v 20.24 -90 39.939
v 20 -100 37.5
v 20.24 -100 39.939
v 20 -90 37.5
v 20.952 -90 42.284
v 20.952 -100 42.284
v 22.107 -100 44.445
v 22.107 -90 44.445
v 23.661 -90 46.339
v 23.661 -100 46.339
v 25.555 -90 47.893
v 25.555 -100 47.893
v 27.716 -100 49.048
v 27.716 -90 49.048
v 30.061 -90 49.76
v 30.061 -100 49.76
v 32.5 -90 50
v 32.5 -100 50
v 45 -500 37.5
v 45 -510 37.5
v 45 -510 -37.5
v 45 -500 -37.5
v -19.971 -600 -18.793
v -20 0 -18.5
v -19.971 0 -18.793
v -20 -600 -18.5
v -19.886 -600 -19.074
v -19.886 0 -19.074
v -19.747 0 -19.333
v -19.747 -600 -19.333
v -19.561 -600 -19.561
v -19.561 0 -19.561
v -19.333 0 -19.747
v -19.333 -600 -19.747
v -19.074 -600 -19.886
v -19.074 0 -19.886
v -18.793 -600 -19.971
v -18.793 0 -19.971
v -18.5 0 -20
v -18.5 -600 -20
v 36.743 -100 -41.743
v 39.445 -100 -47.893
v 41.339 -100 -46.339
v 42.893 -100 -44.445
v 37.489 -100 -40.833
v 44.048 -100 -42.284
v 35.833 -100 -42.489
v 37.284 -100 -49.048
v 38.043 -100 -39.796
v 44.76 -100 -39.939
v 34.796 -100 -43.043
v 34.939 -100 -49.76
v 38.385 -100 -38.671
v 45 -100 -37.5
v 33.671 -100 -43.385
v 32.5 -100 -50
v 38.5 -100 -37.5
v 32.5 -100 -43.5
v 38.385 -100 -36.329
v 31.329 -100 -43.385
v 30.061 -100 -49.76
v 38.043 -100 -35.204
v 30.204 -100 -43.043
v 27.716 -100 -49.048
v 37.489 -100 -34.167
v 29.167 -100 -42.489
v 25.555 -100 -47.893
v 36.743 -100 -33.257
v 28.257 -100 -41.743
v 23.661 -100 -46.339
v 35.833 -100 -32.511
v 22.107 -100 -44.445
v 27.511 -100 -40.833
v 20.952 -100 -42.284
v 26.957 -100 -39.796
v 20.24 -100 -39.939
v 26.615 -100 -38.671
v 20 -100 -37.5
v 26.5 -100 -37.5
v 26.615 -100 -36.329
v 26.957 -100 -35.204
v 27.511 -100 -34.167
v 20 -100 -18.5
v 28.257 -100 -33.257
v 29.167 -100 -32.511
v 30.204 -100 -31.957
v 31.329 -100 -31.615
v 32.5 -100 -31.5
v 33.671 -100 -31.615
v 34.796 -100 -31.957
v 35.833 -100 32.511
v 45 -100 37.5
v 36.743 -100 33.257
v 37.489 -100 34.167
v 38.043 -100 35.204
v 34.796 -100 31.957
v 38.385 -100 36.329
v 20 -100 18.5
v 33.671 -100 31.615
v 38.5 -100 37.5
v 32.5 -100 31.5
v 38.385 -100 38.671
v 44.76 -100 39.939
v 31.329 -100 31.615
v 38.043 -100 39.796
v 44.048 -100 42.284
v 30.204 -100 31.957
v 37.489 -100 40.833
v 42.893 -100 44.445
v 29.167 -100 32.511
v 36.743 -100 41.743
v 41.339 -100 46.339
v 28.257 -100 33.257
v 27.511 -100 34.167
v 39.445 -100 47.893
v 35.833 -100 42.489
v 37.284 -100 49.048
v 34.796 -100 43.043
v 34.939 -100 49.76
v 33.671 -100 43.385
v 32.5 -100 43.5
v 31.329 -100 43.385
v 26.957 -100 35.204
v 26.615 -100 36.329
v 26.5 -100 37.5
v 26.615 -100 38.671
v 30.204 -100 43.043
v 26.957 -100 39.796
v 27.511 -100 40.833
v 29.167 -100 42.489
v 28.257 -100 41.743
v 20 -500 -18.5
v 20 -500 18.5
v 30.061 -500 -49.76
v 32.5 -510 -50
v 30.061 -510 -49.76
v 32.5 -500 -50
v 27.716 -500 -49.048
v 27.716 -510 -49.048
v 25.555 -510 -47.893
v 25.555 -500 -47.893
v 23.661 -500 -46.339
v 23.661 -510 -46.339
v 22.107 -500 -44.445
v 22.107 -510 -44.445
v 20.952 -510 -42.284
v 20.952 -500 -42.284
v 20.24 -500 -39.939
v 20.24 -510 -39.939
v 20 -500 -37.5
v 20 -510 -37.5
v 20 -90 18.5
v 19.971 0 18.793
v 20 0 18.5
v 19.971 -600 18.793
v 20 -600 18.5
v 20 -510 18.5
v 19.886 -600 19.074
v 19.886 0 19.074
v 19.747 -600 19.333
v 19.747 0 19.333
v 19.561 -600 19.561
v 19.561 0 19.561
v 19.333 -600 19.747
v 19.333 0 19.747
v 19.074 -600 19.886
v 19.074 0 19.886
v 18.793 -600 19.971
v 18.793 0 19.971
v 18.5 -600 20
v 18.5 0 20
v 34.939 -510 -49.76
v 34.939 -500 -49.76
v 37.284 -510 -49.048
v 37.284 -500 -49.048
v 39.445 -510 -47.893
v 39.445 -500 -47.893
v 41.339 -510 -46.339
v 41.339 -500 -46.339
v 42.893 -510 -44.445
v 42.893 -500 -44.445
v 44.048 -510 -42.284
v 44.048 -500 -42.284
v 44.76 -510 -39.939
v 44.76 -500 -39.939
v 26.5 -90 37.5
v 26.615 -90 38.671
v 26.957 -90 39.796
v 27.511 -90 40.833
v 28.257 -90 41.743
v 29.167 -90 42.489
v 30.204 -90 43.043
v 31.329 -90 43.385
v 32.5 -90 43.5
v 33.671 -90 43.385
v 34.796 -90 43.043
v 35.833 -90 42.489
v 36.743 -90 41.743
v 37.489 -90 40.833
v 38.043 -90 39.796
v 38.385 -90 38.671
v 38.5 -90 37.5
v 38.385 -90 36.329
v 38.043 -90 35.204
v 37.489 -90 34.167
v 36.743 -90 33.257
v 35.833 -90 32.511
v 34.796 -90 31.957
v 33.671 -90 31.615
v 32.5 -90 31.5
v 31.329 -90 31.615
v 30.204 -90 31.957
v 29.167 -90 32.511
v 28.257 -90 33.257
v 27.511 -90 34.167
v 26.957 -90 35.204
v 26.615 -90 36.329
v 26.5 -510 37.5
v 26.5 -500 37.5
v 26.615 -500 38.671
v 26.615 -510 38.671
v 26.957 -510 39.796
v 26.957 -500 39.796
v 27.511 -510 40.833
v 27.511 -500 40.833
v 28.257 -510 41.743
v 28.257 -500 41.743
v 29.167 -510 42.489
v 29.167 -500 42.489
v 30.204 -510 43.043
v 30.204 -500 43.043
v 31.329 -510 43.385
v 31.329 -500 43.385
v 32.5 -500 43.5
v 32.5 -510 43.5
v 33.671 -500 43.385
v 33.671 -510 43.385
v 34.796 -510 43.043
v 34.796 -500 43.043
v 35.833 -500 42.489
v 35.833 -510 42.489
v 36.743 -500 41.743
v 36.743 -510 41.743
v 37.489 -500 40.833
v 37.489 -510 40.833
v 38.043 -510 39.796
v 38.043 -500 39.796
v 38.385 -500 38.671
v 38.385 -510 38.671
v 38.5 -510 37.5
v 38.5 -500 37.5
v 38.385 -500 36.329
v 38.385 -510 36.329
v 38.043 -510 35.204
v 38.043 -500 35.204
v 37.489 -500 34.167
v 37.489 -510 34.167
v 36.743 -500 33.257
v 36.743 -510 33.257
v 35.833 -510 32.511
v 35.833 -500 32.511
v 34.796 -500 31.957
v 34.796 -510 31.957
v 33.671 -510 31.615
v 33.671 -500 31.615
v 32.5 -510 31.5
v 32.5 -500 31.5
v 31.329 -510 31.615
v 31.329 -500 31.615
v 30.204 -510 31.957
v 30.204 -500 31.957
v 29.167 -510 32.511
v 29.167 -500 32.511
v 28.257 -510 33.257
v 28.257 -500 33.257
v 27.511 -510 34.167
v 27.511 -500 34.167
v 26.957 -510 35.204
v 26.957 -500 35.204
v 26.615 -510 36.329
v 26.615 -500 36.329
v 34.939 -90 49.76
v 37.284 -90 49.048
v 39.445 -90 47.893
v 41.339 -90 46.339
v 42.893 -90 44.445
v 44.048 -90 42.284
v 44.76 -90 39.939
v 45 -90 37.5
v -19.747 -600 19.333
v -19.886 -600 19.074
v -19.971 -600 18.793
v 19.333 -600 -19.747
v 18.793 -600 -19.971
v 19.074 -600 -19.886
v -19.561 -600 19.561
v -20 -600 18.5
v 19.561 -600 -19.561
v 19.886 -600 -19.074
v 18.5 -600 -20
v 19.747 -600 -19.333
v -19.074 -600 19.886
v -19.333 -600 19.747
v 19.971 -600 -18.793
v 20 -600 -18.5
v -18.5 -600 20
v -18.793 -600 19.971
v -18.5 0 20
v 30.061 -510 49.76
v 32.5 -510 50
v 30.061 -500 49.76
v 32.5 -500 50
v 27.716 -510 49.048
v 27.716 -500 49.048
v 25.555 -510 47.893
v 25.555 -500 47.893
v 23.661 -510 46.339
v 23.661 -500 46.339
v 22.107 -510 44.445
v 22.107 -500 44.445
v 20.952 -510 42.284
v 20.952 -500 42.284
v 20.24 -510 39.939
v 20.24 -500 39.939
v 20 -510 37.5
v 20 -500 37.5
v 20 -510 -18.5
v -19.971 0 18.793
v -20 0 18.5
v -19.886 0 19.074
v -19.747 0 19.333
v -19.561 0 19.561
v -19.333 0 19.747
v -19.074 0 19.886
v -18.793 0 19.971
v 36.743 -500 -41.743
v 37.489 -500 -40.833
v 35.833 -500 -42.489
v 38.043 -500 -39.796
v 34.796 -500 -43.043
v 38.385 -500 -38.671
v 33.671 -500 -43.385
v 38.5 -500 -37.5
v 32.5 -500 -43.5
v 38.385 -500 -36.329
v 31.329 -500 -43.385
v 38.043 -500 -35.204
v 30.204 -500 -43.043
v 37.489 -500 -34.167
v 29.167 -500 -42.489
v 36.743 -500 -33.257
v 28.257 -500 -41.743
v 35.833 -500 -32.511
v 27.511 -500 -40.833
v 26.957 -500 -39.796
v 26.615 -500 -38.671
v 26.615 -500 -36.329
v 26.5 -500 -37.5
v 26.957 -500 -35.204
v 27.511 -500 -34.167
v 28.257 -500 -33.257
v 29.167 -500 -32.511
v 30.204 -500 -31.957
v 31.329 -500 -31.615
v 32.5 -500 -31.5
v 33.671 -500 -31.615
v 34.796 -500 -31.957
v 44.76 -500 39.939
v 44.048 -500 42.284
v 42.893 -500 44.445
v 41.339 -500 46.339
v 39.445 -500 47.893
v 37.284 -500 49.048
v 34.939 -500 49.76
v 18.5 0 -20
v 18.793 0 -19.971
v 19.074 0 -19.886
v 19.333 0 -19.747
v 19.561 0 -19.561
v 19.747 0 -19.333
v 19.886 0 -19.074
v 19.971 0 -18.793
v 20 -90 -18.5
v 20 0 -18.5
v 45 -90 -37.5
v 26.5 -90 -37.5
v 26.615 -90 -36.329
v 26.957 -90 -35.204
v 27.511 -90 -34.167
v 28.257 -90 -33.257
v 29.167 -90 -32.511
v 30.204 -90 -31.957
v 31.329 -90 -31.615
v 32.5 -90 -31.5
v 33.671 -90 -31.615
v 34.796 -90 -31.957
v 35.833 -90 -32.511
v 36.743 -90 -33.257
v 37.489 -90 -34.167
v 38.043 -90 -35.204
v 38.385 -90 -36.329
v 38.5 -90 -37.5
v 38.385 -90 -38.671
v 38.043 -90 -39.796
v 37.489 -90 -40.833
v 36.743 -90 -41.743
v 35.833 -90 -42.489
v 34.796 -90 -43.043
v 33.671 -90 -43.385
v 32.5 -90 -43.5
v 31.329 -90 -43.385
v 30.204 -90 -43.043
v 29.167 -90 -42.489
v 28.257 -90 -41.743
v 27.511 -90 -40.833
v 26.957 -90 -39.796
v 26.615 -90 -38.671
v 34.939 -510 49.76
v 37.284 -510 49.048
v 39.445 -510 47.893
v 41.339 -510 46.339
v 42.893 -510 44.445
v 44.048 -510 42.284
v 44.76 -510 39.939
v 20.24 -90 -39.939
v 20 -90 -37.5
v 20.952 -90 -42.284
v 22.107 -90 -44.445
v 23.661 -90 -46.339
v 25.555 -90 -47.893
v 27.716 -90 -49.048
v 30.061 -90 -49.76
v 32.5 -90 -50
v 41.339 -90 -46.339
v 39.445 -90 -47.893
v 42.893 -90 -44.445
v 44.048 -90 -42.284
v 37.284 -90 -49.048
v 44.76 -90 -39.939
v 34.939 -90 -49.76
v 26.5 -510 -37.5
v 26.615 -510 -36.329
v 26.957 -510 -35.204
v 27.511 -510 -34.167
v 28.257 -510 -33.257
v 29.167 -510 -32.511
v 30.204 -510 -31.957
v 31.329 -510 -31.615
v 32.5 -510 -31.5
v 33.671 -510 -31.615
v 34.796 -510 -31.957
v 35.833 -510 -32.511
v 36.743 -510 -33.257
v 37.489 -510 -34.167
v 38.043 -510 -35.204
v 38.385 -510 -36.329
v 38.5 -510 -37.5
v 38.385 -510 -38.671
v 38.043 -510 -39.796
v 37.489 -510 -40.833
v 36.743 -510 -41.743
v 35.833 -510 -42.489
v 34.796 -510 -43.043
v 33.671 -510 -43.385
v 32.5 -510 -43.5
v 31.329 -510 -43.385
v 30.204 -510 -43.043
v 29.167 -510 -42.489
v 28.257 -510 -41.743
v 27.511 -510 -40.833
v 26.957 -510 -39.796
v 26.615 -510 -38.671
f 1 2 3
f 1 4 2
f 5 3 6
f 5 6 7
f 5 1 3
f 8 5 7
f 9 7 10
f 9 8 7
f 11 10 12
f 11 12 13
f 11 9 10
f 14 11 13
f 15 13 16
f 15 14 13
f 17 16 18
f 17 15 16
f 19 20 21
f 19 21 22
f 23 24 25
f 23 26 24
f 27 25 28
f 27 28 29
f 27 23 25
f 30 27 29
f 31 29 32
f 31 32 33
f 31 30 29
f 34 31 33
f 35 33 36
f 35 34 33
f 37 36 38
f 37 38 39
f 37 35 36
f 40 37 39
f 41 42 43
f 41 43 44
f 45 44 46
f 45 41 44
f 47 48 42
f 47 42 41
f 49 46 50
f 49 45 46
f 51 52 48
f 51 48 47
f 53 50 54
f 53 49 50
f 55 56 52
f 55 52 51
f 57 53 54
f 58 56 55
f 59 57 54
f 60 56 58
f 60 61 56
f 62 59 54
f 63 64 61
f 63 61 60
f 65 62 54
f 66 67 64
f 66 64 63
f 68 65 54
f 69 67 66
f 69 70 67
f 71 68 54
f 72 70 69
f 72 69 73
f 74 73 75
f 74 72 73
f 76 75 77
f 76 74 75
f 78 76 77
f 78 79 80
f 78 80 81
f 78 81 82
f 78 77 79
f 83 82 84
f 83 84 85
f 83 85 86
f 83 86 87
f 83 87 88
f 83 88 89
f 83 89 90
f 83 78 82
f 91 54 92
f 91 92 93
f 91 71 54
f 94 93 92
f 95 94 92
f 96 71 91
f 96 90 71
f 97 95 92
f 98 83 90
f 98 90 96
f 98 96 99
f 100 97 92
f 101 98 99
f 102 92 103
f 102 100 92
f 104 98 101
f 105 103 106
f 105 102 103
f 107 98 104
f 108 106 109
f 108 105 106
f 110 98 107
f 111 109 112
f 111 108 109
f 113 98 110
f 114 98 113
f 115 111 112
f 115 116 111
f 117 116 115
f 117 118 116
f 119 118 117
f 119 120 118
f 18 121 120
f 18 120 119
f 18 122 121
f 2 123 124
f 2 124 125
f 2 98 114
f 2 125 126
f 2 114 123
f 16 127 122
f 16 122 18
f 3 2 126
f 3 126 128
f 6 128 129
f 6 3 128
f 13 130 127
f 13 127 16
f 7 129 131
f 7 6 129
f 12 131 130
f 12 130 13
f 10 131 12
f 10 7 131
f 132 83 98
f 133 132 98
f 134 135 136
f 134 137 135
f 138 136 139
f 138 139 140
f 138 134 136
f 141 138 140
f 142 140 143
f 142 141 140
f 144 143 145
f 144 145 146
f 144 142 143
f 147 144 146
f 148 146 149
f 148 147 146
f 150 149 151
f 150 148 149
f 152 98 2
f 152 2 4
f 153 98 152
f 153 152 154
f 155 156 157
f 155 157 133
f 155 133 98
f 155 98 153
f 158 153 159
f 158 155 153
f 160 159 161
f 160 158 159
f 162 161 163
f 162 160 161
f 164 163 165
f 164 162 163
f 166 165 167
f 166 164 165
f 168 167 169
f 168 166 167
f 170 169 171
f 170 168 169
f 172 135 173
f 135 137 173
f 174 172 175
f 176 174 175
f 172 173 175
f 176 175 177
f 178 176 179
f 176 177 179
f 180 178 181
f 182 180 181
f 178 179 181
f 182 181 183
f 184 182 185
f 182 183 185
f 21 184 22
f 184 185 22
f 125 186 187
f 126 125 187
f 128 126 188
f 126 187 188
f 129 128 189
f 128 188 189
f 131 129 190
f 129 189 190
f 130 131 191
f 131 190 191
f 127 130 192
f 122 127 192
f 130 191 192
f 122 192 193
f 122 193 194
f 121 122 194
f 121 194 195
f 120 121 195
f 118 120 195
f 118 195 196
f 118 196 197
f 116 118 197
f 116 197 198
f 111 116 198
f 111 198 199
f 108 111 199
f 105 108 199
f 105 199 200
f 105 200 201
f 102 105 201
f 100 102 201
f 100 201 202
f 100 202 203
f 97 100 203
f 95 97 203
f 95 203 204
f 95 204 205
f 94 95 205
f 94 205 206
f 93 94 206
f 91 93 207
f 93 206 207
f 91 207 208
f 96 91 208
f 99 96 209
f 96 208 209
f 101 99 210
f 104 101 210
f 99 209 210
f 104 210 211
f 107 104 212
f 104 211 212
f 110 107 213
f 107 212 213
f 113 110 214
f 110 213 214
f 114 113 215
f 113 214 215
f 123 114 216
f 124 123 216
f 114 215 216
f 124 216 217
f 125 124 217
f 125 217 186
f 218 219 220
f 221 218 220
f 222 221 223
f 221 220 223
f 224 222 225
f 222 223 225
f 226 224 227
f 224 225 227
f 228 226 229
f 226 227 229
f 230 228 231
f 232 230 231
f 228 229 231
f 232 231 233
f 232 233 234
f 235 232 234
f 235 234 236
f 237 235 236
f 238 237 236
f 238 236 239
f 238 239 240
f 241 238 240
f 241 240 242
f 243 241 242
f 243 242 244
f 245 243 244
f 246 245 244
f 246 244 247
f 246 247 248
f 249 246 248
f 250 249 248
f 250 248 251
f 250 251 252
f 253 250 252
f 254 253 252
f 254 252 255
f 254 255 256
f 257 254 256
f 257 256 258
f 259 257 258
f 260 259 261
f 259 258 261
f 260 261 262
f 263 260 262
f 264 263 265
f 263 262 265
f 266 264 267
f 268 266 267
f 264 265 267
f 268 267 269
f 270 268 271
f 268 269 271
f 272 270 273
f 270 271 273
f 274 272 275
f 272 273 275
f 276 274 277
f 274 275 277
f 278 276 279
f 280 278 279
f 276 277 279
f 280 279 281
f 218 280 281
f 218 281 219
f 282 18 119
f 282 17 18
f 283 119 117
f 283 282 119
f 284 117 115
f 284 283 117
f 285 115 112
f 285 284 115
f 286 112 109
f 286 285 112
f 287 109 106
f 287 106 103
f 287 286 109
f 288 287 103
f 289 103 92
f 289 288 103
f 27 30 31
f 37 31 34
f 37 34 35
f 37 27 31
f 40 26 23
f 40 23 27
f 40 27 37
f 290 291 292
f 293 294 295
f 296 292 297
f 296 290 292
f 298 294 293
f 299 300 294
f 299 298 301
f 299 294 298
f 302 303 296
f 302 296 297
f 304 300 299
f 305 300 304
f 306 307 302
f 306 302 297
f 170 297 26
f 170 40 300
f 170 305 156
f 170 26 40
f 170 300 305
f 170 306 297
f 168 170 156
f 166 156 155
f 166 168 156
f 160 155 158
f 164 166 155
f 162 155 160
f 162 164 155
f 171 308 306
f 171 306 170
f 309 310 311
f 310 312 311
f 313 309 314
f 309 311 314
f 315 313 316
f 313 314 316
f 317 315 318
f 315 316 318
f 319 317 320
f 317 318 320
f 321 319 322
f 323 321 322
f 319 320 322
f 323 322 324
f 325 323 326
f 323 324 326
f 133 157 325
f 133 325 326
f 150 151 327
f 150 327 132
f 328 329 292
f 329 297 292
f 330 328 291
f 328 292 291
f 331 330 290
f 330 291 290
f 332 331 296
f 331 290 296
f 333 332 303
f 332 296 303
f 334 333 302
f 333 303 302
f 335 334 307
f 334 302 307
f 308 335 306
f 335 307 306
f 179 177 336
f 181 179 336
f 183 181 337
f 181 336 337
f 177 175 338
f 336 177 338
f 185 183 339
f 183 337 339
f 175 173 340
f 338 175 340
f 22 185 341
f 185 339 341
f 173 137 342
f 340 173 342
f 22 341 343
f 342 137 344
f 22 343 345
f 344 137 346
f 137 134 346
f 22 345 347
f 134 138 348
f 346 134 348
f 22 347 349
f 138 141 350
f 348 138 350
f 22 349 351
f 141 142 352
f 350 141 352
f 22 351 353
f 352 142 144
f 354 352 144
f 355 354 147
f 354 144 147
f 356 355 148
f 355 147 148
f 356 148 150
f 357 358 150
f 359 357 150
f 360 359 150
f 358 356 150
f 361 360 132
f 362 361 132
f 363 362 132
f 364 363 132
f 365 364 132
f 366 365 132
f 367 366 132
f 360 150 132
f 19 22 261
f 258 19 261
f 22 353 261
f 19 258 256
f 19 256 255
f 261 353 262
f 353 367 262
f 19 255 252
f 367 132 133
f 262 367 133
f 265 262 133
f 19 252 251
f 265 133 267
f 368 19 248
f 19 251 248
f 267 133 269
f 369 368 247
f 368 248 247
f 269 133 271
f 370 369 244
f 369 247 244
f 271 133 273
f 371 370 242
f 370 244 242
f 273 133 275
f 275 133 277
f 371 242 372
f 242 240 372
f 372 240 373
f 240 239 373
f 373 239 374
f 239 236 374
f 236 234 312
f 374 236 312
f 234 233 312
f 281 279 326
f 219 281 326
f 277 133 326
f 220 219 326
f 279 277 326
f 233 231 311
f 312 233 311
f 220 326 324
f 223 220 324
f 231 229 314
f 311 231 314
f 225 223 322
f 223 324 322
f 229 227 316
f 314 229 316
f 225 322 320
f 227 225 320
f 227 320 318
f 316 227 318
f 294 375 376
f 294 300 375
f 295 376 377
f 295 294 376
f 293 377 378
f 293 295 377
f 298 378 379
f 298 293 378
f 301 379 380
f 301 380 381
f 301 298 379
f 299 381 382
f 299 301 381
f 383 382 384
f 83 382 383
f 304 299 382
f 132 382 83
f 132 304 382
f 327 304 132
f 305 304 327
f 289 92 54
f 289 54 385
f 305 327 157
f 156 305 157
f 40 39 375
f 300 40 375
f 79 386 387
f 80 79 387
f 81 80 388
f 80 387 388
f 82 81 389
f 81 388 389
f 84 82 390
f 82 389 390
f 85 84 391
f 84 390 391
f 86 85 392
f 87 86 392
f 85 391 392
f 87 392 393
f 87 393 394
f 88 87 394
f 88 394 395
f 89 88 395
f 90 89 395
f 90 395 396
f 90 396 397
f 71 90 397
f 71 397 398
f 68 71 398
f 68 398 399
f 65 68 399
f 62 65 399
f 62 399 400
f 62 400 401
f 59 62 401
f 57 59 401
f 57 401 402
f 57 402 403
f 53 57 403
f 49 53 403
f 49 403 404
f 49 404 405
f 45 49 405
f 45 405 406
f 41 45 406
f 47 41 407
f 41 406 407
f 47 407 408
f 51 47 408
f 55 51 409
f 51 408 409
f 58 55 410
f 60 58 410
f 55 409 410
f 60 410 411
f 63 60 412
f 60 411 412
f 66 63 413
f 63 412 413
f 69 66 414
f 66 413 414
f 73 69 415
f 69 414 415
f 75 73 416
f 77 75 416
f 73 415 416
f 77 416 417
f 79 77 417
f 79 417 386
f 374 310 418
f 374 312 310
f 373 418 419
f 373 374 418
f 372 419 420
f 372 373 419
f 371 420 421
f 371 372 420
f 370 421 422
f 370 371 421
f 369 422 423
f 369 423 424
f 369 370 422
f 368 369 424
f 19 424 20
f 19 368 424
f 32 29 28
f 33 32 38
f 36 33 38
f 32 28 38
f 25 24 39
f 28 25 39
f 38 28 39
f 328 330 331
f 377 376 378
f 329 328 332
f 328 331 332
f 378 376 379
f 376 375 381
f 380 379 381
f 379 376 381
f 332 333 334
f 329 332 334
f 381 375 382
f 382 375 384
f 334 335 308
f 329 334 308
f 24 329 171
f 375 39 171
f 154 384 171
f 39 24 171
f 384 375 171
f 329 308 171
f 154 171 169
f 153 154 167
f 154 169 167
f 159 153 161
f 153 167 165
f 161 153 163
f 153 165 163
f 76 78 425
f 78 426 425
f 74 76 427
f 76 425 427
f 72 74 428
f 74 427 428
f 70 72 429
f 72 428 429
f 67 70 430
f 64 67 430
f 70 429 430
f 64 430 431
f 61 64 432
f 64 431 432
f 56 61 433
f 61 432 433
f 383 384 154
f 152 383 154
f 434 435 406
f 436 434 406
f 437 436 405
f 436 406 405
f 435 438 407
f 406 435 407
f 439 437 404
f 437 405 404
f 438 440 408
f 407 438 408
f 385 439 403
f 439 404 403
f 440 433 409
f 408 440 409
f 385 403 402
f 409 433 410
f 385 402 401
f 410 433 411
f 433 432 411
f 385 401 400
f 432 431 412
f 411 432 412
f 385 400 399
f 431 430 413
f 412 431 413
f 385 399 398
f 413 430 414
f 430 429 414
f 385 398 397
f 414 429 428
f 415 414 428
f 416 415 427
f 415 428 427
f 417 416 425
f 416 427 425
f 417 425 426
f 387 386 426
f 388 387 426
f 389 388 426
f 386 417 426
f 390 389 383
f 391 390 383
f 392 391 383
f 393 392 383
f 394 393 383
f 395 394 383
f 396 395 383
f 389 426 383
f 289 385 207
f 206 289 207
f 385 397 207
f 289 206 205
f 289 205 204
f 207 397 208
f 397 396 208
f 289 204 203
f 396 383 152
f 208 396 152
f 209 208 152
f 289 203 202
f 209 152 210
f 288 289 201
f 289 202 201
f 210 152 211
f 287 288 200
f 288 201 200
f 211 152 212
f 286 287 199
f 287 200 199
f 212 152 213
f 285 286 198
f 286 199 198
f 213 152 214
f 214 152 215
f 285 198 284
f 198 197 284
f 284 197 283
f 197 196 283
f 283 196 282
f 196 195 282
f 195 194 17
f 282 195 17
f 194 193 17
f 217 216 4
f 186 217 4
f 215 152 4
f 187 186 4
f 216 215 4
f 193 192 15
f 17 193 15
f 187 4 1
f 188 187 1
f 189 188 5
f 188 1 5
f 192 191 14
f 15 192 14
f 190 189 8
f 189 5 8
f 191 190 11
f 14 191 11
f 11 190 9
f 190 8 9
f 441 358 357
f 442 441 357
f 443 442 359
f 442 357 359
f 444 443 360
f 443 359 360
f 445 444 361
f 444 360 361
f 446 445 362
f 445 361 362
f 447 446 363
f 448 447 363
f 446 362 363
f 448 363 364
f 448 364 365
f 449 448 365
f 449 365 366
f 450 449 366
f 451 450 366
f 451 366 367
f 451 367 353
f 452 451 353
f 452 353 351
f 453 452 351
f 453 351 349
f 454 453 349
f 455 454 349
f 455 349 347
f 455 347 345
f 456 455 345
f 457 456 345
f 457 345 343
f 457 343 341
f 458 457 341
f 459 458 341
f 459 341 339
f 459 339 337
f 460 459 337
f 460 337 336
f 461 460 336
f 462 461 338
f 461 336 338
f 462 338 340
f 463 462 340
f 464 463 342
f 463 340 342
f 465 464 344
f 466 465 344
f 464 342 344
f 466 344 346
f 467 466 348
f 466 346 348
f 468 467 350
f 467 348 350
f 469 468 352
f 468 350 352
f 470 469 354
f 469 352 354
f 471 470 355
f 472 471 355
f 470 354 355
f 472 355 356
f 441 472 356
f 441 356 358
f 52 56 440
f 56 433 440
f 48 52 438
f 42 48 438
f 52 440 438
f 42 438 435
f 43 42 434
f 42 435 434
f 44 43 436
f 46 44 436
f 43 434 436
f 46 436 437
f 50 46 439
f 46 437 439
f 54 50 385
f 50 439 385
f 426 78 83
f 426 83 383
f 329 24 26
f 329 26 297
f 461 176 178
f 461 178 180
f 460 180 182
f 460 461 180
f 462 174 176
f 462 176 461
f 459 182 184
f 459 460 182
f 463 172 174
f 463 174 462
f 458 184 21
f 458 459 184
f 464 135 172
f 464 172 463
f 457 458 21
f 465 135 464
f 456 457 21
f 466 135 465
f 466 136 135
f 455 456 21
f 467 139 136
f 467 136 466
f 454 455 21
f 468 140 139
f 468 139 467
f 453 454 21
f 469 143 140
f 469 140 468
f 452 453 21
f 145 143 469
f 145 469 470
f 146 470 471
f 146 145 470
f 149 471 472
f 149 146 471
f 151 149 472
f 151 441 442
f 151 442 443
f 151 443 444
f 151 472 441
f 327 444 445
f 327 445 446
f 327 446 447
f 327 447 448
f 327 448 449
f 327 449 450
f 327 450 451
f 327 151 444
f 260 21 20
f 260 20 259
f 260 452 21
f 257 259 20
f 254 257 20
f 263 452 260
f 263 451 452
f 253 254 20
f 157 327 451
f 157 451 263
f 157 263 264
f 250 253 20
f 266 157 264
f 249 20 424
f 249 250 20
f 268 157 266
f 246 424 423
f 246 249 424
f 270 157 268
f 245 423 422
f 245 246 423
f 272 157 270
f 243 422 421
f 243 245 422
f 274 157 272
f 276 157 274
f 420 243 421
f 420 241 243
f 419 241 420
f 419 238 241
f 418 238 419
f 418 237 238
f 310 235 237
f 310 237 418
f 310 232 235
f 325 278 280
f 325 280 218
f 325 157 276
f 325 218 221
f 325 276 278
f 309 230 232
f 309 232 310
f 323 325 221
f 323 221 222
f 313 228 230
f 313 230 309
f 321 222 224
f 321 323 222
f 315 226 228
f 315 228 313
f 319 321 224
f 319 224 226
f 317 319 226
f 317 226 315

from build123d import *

# Parameters (mm, degrees)
F0_W     = 40
F0_H     = 40
F1_DEPTH = 600
F2_R     = 1.5
F3_W     = 10
F3_H     = 100
F4_DEPTH = 25
F5_R     = 12.49999
F7_D     = 12
F7_DEPTH = 450
F7_TIP   = 3.6051637142


# Not quite as in the source:
# - a fillet or chamfer is up to 0.001 mm smaller than in the source, because OpenCascade refuses the exact size


with BuildPart() as f1:
    # F0 (on Front) → F1 (new body)
    with BuildSketch(Plane.XZ):
        Rectangle(F0_W, F0_H)
    extrude(amount=F1_DEPTH)

    # F2
    f2_edges = [f1.edges().sort_by_distance(p)[0] for p in [
        (-20, -300, 20),
        (-20, -300, -20),
        (20, -300, 20),
        (20, -300, -20),
    ]]
    fillet(f2_edges, radius=F2_R)

    # F3 (on face) → F4 (join)
    with BuildSketch(Plane.YZ.offset(20)):
        with Locations((-505, 0)):
            Rectangle(F3_W, F3_H)
        with Locations((-95, 0)):
            Rectangle(F3_W, F3_H)
    extrude(amount=F4_DEPTH)

    # F5 (radius 12.5 in the source; OpenCascade refuses exactly that, so slightly less here)
    f5_edges = [f1.edges().sort_by_distance(p)[0] for p in [
        (45, -505, 50),
        (20, -505, 50),
        (45, -95, 50),
        (20, -95, 50),
        (45, -95, -50),
        (45, -505, -50),
        (20, -505, -50),
        (20, -95, -50),
    ]]
    fillet(f5_edges, radius=F5_R)

    # F7
    with Locations(Plane.XZ.offset(510)):
        with Locations((32.5, 37.5), (32.5, -37.5)):
            Hole(F7_D / 2, depth=F7_DEPTH)
            with Locations((0, 0, -(F7_DEPTH + F7_TIP / 2))):  # 118° drill point
                Cone(0, F7_D / 2, F7_TIP, mode=Mode.SUBTRACT)


solid = f1.part
